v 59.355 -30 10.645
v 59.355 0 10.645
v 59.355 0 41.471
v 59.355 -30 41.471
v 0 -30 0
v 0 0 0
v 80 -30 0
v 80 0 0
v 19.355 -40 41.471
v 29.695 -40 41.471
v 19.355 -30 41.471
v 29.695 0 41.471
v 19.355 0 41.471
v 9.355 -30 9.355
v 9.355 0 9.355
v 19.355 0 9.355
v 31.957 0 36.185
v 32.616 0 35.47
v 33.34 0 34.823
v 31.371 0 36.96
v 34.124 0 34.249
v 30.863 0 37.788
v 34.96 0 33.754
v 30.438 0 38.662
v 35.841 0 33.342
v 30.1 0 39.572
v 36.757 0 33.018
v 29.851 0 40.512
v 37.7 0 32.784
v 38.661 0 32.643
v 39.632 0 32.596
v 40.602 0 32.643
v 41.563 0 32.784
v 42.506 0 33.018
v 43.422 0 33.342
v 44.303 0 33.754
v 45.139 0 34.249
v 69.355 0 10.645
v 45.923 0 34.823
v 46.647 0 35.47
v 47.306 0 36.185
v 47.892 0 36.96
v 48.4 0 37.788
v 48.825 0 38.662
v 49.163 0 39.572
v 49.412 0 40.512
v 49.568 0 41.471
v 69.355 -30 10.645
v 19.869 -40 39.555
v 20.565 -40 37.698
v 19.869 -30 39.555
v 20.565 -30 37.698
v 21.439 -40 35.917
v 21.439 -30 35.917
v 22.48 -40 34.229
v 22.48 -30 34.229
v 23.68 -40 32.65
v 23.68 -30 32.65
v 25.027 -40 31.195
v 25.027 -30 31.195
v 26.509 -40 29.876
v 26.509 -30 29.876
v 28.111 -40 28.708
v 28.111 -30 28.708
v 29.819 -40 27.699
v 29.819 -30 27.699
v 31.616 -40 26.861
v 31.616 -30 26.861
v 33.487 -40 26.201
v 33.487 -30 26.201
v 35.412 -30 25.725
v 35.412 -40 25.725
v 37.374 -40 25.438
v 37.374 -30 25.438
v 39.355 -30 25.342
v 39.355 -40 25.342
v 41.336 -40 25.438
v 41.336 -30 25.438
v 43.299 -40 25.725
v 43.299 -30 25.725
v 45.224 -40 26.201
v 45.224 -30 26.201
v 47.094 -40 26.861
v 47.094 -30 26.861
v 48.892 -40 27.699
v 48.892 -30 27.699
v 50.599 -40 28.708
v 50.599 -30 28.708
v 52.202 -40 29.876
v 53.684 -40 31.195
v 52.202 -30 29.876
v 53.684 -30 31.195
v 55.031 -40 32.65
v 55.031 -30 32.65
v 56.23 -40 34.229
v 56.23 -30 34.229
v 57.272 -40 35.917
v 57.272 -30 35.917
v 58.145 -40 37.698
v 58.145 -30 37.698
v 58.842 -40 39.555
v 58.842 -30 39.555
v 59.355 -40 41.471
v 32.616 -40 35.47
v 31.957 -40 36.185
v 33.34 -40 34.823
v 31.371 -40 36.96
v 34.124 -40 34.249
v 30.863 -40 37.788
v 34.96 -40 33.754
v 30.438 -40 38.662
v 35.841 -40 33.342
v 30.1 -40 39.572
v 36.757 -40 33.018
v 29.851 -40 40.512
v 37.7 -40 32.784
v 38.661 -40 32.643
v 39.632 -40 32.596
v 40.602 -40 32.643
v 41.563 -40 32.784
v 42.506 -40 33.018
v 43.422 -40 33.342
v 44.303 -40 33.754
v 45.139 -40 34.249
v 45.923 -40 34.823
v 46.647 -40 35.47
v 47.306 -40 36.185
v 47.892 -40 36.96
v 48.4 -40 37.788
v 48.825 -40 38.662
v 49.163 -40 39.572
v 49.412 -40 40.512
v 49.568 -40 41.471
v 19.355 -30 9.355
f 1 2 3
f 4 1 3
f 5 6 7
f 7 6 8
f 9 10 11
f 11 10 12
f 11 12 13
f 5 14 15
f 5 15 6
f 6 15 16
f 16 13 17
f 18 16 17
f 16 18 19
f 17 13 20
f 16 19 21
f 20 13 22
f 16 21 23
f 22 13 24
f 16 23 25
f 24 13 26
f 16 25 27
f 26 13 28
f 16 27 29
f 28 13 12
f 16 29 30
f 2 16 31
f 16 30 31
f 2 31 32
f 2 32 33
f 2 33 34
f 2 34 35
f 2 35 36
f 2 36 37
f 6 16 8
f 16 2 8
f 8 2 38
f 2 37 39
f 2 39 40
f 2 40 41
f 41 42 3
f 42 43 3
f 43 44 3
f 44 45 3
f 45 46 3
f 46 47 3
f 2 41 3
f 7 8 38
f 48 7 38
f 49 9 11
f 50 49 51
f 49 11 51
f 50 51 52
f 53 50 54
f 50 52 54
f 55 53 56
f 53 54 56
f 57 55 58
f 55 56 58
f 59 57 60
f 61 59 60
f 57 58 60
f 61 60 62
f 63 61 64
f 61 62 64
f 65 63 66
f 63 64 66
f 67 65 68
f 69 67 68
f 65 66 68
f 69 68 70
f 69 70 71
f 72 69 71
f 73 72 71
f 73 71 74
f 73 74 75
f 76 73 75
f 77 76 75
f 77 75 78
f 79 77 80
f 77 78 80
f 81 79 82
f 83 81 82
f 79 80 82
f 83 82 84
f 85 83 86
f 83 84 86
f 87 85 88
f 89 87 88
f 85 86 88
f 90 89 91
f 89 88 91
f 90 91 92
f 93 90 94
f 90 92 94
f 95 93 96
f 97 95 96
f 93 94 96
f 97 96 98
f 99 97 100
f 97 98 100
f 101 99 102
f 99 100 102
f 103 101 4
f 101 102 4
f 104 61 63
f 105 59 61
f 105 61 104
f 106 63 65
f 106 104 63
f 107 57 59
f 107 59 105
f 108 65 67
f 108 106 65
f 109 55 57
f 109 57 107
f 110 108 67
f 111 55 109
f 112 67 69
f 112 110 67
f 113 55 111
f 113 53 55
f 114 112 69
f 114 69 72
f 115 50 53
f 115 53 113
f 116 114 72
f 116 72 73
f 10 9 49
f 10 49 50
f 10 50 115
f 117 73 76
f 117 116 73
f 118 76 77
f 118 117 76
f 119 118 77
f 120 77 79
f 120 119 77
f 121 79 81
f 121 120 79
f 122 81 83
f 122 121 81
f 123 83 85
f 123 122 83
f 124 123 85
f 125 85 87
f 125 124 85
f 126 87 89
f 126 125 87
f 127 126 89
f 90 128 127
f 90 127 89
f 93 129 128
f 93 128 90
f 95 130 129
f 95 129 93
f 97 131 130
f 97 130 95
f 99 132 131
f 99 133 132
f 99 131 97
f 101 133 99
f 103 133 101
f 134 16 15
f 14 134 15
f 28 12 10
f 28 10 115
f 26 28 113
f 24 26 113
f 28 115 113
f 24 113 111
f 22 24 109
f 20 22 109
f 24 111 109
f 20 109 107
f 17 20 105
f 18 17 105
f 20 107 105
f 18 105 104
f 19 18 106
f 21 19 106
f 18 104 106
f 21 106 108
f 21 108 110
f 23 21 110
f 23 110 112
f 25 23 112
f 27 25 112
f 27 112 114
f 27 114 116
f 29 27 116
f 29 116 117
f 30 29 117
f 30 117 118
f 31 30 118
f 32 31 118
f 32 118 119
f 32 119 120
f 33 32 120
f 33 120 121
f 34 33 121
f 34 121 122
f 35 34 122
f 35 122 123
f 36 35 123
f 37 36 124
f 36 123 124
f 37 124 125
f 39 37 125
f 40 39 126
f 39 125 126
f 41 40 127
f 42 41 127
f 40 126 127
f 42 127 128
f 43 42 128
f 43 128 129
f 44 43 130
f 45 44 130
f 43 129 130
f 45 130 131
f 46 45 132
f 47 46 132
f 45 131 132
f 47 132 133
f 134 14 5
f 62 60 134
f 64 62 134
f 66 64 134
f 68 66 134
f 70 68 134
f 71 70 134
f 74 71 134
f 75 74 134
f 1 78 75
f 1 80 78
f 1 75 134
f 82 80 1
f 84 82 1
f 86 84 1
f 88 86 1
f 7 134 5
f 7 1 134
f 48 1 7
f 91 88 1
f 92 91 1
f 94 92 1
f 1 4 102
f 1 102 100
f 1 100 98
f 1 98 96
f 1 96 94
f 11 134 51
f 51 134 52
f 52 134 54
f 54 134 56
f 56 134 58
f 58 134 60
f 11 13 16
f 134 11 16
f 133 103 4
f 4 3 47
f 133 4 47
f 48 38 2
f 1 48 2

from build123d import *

# Parameters (mm, degrees)
F1_DEPTH = 30
F3_DEPTH = 10
F5_DEPTH = 40.001


with BuildPart() as f1:
    # F0 (on Front) → F1 (new body)
    with BuildSketch(Plane.XZ):
        Polygon((9.355192, 9.355192), (0, 0), (80, 0), (69.355192, 10.644808), (59.355192, 10.644808), (59.355192, 41.47071), (19.355192, 41.47071), (19.355192, 9.355192), align=None)
    extrude(amount=F1_DEPTH)

    # F2 (on face) → F3 (join)
    with BuildSketch(Plane.XZ.offset(30)):
        with BuildLine():
            Line((59.355192, 41.47071), (19.355192, 41.47071))
            ThreePointArc((19.355192, 41.47071), (39.355192, 25.341718), (59.355192, 41.47071))
        make_face()
    extrude(amount=F3_DEPTH)

    # F4 (on face) → F5 (cut, through all)
    with BuildSketch(Plane.XZ.offset(40)):
        with BuildLine():
            Line((49.568015, 41.47071), (29.695006, 41.47071))
            ThreePointArc((29.695006, 41.47071), (39.631511, 32.595821), (49.568015, 41.47071))
        make_face()
    extrude(amount=-F5_DEPTH, mode=Mode.SUBTRACT)


solid = f1.part
